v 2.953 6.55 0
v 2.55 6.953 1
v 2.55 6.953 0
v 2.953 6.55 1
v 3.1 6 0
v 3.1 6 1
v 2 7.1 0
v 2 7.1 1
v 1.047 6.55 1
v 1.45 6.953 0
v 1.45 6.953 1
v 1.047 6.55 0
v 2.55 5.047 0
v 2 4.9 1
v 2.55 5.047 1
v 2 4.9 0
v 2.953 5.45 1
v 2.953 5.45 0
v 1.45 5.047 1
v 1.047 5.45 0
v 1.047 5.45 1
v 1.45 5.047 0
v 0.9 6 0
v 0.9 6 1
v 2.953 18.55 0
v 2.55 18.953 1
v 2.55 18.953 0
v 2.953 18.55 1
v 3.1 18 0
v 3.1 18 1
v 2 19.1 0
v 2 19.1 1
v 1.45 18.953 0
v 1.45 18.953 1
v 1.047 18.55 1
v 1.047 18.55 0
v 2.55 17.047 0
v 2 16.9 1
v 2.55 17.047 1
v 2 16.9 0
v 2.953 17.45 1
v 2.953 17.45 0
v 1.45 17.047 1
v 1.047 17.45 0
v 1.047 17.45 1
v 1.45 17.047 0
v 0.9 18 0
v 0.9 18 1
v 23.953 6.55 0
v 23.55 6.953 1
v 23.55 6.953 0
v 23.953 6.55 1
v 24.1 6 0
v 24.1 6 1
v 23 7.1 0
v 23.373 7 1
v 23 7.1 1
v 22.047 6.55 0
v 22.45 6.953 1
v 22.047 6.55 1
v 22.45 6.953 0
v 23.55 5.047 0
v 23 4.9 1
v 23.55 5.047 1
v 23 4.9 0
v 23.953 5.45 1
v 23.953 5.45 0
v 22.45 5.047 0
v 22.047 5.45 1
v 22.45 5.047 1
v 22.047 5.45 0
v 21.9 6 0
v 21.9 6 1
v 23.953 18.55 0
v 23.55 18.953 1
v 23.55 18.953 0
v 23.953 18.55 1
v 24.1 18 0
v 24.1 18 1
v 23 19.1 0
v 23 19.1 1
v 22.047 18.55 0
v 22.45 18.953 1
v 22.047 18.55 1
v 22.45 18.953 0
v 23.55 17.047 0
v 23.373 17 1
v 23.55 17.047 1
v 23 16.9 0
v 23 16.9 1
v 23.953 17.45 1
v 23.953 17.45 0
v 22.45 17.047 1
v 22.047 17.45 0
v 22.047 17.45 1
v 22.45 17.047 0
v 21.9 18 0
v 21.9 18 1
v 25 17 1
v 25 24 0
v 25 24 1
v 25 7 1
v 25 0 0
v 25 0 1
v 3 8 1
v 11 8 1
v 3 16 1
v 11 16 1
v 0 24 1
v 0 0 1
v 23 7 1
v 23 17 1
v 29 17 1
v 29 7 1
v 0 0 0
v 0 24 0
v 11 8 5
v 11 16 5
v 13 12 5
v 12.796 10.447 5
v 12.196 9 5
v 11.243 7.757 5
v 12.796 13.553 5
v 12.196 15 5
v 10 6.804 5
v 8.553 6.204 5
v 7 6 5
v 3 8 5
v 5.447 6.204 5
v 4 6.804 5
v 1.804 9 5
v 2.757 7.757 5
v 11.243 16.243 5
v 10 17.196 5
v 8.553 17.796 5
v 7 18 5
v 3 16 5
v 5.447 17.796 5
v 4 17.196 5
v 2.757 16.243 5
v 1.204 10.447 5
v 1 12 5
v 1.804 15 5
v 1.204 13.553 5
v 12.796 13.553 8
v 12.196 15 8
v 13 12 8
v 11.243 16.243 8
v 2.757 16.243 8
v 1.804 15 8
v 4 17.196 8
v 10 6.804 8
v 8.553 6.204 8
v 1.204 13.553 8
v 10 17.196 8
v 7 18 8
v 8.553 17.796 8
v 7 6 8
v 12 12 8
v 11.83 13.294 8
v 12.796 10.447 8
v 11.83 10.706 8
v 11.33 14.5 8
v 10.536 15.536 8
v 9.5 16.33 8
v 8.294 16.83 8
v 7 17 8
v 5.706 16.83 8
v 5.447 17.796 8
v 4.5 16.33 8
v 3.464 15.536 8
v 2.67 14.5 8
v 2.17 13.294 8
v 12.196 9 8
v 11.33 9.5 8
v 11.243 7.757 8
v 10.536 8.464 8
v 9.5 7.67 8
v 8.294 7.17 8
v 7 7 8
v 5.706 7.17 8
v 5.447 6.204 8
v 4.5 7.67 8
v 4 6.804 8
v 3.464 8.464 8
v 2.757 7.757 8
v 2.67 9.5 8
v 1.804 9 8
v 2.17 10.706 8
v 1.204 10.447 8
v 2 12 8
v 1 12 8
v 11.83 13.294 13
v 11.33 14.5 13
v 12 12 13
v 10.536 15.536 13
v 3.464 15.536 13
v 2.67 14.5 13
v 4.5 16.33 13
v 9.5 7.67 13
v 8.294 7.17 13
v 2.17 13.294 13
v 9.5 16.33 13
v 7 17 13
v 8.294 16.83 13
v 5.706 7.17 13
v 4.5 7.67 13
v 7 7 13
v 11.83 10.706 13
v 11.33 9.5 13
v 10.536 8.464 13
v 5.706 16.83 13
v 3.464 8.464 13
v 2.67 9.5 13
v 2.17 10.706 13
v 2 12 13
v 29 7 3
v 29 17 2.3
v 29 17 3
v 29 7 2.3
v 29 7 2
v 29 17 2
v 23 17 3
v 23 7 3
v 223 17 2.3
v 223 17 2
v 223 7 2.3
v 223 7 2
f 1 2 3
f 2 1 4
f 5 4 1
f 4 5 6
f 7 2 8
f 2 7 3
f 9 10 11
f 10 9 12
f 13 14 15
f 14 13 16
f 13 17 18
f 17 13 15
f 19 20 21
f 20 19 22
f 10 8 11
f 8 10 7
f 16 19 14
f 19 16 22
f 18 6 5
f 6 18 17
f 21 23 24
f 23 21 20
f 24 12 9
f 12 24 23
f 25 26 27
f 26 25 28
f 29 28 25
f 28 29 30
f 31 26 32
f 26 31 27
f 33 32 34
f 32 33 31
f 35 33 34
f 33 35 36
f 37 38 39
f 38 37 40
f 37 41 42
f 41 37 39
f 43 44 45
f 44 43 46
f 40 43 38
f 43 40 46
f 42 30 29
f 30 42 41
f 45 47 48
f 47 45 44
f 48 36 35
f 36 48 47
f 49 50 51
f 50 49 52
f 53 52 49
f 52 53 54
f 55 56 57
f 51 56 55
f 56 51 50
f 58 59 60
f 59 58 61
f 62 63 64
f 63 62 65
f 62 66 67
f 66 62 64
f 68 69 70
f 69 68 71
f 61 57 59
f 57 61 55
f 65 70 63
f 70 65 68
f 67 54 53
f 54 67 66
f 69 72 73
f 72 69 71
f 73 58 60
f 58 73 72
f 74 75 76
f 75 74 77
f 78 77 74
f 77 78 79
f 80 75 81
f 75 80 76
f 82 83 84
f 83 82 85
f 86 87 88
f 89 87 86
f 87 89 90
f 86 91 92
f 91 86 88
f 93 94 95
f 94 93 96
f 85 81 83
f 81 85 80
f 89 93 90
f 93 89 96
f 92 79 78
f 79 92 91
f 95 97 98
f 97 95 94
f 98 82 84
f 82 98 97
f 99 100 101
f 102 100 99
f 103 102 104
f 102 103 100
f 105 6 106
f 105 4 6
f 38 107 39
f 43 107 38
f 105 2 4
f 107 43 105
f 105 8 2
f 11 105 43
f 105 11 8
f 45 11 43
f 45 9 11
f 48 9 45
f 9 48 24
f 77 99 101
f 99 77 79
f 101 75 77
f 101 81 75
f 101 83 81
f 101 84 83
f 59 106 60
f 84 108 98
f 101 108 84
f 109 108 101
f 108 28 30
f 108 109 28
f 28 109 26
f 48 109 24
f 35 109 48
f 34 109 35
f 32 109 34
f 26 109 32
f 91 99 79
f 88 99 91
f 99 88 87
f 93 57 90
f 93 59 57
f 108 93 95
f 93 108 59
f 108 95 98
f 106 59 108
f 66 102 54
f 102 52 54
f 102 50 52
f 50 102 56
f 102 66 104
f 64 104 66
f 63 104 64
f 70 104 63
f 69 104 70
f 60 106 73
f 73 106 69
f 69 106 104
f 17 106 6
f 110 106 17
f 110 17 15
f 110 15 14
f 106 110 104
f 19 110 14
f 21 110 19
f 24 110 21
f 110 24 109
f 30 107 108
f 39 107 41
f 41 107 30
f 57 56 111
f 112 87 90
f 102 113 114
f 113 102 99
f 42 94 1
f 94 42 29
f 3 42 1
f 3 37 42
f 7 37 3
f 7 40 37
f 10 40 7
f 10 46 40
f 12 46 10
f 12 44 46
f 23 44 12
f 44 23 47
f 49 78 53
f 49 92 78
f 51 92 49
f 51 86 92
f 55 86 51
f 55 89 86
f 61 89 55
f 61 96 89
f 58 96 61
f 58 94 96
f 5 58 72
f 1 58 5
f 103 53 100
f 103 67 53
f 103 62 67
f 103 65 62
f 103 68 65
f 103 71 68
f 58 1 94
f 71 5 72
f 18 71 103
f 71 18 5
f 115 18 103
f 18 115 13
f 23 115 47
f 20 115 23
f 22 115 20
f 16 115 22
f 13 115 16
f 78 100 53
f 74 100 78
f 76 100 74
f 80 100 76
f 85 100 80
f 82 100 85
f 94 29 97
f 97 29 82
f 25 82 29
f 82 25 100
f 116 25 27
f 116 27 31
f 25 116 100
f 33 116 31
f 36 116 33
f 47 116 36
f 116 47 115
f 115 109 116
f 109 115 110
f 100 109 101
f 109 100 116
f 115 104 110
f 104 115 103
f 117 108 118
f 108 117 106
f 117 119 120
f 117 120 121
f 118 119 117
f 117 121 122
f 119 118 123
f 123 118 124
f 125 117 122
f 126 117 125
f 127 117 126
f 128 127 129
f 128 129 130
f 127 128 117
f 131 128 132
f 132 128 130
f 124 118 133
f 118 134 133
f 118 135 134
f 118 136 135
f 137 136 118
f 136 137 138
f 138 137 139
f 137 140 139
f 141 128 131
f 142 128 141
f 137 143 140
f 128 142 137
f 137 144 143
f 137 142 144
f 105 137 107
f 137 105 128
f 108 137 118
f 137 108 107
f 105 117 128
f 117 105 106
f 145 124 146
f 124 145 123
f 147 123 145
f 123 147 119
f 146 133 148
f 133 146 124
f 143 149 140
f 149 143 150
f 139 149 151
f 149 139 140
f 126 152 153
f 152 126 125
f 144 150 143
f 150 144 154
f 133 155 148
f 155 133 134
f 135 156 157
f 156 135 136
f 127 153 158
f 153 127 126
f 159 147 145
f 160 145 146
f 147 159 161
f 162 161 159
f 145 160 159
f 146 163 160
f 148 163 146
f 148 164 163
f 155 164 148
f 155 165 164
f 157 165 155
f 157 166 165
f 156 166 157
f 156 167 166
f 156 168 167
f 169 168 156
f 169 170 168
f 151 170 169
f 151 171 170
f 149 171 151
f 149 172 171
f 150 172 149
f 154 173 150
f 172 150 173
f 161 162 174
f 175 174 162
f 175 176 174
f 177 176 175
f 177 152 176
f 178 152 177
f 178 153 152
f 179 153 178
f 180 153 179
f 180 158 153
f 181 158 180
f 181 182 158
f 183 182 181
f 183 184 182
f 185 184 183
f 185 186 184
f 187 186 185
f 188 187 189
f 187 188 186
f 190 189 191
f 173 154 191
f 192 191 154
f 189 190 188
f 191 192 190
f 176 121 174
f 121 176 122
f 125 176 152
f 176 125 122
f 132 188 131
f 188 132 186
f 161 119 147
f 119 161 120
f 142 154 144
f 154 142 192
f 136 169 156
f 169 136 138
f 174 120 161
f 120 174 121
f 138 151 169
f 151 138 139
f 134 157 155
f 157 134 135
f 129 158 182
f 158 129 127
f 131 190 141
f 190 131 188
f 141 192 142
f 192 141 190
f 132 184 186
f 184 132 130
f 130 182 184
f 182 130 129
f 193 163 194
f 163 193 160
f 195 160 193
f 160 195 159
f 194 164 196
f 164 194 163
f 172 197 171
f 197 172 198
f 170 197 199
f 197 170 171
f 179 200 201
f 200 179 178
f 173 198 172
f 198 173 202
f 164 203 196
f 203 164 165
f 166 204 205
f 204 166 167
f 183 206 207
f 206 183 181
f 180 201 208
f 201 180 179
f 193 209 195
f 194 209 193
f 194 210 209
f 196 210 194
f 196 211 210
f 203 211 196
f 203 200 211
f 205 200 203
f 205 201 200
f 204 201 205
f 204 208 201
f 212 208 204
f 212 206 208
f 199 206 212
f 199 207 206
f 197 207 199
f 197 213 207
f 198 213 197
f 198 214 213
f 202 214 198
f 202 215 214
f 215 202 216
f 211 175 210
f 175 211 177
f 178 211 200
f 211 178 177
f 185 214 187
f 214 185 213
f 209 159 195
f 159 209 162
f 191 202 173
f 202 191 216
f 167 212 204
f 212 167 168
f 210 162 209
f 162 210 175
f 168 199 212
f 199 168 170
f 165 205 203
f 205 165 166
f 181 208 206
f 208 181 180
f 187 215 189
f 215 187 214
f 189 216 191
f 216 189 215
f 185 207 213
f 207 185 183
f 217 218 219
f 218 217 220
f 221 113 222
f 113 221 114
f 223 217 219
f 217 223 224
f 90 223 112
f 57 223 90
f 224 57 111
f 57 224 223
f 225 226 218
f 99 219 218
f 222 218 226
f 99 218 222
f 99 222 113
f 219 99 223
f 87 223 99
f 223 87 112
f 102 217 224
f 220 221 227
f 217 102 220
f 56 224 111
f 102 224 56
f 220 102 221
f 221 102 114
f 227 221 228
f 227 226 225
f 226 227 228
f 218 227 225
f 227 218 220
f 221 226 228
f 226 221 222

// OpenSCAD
// Obstacle Avoidance Camera — OV5647 5MP MIPI Module
// BOM: 2x OV5647, 5M MIPI 16-pin FFC cable, 130° FoV, no IR-cut filter
// $6-7 each.
//
// All dimensions (estimate) — based on Raspberry Pi Camera Module v1 form
// factor. The BOM variant is "night vision" (no IR-cut filter), but the
// PCB dimensions should match standard OV5647 modules.
//
// Licensed CC0 — use freely.

// ===== PARAMETERS =====

// ---- PCB (estimate: ~25 x 24 mm for Pi Cam v1 form factor) ----
pcb_l      = 25;   // mm (estimate: PCB length)
pcb_w      = 24;   // mm (estimate: PCB width)
pcb_thick  =  1.0; // mm (estimate: thin flex-capable PCB, ~1mm)

// ---- Image sensor die + holder (estimate) ----
sensor_x   =  8;   // mm (estimate: sensor package width)
sensor_y   =  8;   // mm (estimate: sensor package length)
sensor_z   =  4;   // mm (estimate: sensor package height above PCB)
sensor_ofs_x = 7;  // mm (estimate: sensor center from PCB edge)
sensor_ofs_y = pcb_w / 2; // centered on PCB width

// ---- Lens holder (estimate) ----
lens_holder_dia = 12;   // mm (estimate: M12 lens mount)
lens_holder_h   =  3;   // mm (estimate: holder base height above sensor)
lens_barrel_h   =  8;   // mm (estimate: total lens barrel height above sensor)
lens_barrel_dia = 10;   // mm (estimate: barrel outer diameter)
lens_fov        = 130;  // degrees (BOM spec: 130°)

// ---- FFC connector (16-pin, 0.5mm pitch) ----
ffc_conn_w     = 10;   // mm (estimate: 16-pin × 0.5mm ≈ 8mm + frame)
ffc_conn_d     =  6;   // mm (estimate: connector depth)
ffc_conn_h     =  2;   // mm (estimate: connector height including actuator)
ffc_conn_ofs_x = pcb_l - 2; // mm (estimate: near short edge)
ffc_conn_ofs_y = pcb_w/2;   // centered

// ---- Mounting holes ----
mtg_hole_dia   =  2.2; // mm (estimate: M2 hole, typical for Pi Cam)
mtg_hole_spacing_x = 21; // mm (estimate: center-to-center along length)
mtg_hole_spacing_y = 12; // mm (estimate: center-to-center along width)

// ---- Cable ----
cable_width  = 10;   // mm (estimate: 16-pin 0.5mm FFC = ~8mm + margins)
cable_length = 200;  // mm (estimate: BOM "16-pin cable" — length unspecified)
cable_thick  =  0.3; // mm (estimate: standard FFC thickness)

$fn = 24;

// ===== MODULES =====

module pcb_board() {
    color("DarkGreen", 0.85) {
        difference() {
            translate([0, 0, 0])
                cube([pcb_l, pcb_w, pcb_thick]);
            
            // Mounting holes
            for (dx = [(pcb_l - mtg_hole_spacing_x)/2,
                        (pcb_l + mtg_hole_spacing_x)/2])
                for (dy = [(pcb_w - mtg_hole_spacing_y)/2,
                            (pcb_w + mtg_hole_spacing_y)/2])
                    translate([dx, dy, -0.1])
                        cylinder(h=pcb_thick + 0.2, d=mtg_hole_dia, $fn=12);
        }
    }
}

module sensor_die() {
    // Image sensor in BGA/CSP package
    translate([sensor_ofs_x - sensor_x/2, sensor_ofs_y - sensor_y/2, pcb_thick]) {
        color("Black")
            cube([sensor_x, sensor_y, sensor_z]);
        // Glass cover / IR window
        color("DarkSlateBlue", 0.4)
            translate([0.5, 0.5, sensor_z - 0.2])
                cube([sensor_x - 1, sensor_y - 1, 0.2]);
    }
}

module lens_assembly() {
    // M12 lens mount + barrel
    translate([sensor_ofs_x, sensor_ofs_y, pcb_thick + sensor_z]) {
        // Threaded holder base
        color("DarkGray")
            cylinder(h=lens_holder_h, d=lens_holder_dia);
        // Lens barrel
        color("Black")
            translate([0, 0, lens_holder_h])
                cylinder(h=lens_barrel_h - lens_holder_h, d=lens_barrel_dia);
        // Lens element (front element visible at top)
        color("DarkSlateBlue", 0.3)
            translate([0, 0, lens_barrel_h - 0.5])
                cylinder(h=0.5, d=lens_barrel_dia - 2);
    }
}

module ffc_connector() {
    // 16-pin 0.5mm pitch FFC connector (socket, on PCB)
    color("White") {
        translate([ffc_conn_ofs_x, ffc_conn_ofs_y - ffc_conn_w/2, pcb_thick])
            cube([ffc_conn_d, ffc_conn_w, ffc_conn_h]);
        // Actuator flip-lock (distinct color)
        color("Black")
            translate([ffc_conn_ofs_x, ffc_conn_ofs_y - ffc_conn_w/2 + 1, pcb_thick + ffc_conn_h - 0.5])
                cube([ffc_conn_d - 0.3, ffc_conn_w - 2, 0.5]);
    }
}

module ffc_cable_stub() {
    // Short cable extending from connector
    translate([ffc_conn_ofs_x, ffc_conn_ofs_y, pcb_thick + ffc_conn_h/2]) {
        color("Gray")
            translate([0, -cable_width/2, 0])
                cube([cable_length, cable_width, cable_thick]);
    }
}

module field_of_view_cone() {
    // Transparent indicator of 130° FoV for design reference
    // NOT for printing — purely for spatial understanding
    fov_rad = lens_fov / 2;
    height = 200; // mm — long cone for visualization
    translate([sensor_ofs_x, sensor_ofs_y, pcb_thick + sensor_z + lens_barrel_h]) {
        %rotate([0, 0, 0]) {
            rotate([0, -fov_rad, 0])
                rotate_extrude(angle = 360, $fn=24)
                    translate([0, 0])
                        polygon(points = [[0, 0], [height * cos(fov_rad), height * sin(fov_rad)], [height * cos(fov_rad), 0]]);
        }
    }
}

// ===== ASSEMBLY =====

module camera_module() {
    union() {
        pcb_board();
        sensor_die();
        lens_assembly();
        ffc_connector();
        ffc_cable_stub();
        // field_of_view_cone(); // Uncomment for spatial reference
    }
}

// ===== RENDER =====
camera_module();

// ===== NOTES =====
// (1) OV5647 sensor: 5MP, 2592×1944, 1/4" optical format, 1.4µm pixel.
//     MIPI CSI-2 2-lane interface via 16-pin 0.5mm FFC.
//     No IR-cut filter ("night vision" variant).
//
// (2) BOM specifies 2 units for stereo obstacle avoidance.
//     130° DFoV (diagonal field of view).
//     Search: "OV5647 night vision" on AliExpress.
//
// (3) The lens is an M12-mount wide-angle module. Focal length varies
//     by supplier; the BOM-stated 130° DFoV corresponds to ~2.0-2.4mm EFL
//     on a 1/4" sensor.
//
// (4) Physical dimensions vary significantly between OV5647 module vendors.
//     MEASURE the actual module received. The Raspberry Pi Camera Module v1
//     dimensions are a close proxy but the BOM-specified "night vision"
//     variant may differ (no IR-cut filter means the PCB may be thinner).
//
// (5) The cameras are intended for wide-baseline stereo depth estimation
//     at short range (0.2-2m) for obstacle avoidance, not SLAM (that's
//     handled by the 2D LiDAR).
